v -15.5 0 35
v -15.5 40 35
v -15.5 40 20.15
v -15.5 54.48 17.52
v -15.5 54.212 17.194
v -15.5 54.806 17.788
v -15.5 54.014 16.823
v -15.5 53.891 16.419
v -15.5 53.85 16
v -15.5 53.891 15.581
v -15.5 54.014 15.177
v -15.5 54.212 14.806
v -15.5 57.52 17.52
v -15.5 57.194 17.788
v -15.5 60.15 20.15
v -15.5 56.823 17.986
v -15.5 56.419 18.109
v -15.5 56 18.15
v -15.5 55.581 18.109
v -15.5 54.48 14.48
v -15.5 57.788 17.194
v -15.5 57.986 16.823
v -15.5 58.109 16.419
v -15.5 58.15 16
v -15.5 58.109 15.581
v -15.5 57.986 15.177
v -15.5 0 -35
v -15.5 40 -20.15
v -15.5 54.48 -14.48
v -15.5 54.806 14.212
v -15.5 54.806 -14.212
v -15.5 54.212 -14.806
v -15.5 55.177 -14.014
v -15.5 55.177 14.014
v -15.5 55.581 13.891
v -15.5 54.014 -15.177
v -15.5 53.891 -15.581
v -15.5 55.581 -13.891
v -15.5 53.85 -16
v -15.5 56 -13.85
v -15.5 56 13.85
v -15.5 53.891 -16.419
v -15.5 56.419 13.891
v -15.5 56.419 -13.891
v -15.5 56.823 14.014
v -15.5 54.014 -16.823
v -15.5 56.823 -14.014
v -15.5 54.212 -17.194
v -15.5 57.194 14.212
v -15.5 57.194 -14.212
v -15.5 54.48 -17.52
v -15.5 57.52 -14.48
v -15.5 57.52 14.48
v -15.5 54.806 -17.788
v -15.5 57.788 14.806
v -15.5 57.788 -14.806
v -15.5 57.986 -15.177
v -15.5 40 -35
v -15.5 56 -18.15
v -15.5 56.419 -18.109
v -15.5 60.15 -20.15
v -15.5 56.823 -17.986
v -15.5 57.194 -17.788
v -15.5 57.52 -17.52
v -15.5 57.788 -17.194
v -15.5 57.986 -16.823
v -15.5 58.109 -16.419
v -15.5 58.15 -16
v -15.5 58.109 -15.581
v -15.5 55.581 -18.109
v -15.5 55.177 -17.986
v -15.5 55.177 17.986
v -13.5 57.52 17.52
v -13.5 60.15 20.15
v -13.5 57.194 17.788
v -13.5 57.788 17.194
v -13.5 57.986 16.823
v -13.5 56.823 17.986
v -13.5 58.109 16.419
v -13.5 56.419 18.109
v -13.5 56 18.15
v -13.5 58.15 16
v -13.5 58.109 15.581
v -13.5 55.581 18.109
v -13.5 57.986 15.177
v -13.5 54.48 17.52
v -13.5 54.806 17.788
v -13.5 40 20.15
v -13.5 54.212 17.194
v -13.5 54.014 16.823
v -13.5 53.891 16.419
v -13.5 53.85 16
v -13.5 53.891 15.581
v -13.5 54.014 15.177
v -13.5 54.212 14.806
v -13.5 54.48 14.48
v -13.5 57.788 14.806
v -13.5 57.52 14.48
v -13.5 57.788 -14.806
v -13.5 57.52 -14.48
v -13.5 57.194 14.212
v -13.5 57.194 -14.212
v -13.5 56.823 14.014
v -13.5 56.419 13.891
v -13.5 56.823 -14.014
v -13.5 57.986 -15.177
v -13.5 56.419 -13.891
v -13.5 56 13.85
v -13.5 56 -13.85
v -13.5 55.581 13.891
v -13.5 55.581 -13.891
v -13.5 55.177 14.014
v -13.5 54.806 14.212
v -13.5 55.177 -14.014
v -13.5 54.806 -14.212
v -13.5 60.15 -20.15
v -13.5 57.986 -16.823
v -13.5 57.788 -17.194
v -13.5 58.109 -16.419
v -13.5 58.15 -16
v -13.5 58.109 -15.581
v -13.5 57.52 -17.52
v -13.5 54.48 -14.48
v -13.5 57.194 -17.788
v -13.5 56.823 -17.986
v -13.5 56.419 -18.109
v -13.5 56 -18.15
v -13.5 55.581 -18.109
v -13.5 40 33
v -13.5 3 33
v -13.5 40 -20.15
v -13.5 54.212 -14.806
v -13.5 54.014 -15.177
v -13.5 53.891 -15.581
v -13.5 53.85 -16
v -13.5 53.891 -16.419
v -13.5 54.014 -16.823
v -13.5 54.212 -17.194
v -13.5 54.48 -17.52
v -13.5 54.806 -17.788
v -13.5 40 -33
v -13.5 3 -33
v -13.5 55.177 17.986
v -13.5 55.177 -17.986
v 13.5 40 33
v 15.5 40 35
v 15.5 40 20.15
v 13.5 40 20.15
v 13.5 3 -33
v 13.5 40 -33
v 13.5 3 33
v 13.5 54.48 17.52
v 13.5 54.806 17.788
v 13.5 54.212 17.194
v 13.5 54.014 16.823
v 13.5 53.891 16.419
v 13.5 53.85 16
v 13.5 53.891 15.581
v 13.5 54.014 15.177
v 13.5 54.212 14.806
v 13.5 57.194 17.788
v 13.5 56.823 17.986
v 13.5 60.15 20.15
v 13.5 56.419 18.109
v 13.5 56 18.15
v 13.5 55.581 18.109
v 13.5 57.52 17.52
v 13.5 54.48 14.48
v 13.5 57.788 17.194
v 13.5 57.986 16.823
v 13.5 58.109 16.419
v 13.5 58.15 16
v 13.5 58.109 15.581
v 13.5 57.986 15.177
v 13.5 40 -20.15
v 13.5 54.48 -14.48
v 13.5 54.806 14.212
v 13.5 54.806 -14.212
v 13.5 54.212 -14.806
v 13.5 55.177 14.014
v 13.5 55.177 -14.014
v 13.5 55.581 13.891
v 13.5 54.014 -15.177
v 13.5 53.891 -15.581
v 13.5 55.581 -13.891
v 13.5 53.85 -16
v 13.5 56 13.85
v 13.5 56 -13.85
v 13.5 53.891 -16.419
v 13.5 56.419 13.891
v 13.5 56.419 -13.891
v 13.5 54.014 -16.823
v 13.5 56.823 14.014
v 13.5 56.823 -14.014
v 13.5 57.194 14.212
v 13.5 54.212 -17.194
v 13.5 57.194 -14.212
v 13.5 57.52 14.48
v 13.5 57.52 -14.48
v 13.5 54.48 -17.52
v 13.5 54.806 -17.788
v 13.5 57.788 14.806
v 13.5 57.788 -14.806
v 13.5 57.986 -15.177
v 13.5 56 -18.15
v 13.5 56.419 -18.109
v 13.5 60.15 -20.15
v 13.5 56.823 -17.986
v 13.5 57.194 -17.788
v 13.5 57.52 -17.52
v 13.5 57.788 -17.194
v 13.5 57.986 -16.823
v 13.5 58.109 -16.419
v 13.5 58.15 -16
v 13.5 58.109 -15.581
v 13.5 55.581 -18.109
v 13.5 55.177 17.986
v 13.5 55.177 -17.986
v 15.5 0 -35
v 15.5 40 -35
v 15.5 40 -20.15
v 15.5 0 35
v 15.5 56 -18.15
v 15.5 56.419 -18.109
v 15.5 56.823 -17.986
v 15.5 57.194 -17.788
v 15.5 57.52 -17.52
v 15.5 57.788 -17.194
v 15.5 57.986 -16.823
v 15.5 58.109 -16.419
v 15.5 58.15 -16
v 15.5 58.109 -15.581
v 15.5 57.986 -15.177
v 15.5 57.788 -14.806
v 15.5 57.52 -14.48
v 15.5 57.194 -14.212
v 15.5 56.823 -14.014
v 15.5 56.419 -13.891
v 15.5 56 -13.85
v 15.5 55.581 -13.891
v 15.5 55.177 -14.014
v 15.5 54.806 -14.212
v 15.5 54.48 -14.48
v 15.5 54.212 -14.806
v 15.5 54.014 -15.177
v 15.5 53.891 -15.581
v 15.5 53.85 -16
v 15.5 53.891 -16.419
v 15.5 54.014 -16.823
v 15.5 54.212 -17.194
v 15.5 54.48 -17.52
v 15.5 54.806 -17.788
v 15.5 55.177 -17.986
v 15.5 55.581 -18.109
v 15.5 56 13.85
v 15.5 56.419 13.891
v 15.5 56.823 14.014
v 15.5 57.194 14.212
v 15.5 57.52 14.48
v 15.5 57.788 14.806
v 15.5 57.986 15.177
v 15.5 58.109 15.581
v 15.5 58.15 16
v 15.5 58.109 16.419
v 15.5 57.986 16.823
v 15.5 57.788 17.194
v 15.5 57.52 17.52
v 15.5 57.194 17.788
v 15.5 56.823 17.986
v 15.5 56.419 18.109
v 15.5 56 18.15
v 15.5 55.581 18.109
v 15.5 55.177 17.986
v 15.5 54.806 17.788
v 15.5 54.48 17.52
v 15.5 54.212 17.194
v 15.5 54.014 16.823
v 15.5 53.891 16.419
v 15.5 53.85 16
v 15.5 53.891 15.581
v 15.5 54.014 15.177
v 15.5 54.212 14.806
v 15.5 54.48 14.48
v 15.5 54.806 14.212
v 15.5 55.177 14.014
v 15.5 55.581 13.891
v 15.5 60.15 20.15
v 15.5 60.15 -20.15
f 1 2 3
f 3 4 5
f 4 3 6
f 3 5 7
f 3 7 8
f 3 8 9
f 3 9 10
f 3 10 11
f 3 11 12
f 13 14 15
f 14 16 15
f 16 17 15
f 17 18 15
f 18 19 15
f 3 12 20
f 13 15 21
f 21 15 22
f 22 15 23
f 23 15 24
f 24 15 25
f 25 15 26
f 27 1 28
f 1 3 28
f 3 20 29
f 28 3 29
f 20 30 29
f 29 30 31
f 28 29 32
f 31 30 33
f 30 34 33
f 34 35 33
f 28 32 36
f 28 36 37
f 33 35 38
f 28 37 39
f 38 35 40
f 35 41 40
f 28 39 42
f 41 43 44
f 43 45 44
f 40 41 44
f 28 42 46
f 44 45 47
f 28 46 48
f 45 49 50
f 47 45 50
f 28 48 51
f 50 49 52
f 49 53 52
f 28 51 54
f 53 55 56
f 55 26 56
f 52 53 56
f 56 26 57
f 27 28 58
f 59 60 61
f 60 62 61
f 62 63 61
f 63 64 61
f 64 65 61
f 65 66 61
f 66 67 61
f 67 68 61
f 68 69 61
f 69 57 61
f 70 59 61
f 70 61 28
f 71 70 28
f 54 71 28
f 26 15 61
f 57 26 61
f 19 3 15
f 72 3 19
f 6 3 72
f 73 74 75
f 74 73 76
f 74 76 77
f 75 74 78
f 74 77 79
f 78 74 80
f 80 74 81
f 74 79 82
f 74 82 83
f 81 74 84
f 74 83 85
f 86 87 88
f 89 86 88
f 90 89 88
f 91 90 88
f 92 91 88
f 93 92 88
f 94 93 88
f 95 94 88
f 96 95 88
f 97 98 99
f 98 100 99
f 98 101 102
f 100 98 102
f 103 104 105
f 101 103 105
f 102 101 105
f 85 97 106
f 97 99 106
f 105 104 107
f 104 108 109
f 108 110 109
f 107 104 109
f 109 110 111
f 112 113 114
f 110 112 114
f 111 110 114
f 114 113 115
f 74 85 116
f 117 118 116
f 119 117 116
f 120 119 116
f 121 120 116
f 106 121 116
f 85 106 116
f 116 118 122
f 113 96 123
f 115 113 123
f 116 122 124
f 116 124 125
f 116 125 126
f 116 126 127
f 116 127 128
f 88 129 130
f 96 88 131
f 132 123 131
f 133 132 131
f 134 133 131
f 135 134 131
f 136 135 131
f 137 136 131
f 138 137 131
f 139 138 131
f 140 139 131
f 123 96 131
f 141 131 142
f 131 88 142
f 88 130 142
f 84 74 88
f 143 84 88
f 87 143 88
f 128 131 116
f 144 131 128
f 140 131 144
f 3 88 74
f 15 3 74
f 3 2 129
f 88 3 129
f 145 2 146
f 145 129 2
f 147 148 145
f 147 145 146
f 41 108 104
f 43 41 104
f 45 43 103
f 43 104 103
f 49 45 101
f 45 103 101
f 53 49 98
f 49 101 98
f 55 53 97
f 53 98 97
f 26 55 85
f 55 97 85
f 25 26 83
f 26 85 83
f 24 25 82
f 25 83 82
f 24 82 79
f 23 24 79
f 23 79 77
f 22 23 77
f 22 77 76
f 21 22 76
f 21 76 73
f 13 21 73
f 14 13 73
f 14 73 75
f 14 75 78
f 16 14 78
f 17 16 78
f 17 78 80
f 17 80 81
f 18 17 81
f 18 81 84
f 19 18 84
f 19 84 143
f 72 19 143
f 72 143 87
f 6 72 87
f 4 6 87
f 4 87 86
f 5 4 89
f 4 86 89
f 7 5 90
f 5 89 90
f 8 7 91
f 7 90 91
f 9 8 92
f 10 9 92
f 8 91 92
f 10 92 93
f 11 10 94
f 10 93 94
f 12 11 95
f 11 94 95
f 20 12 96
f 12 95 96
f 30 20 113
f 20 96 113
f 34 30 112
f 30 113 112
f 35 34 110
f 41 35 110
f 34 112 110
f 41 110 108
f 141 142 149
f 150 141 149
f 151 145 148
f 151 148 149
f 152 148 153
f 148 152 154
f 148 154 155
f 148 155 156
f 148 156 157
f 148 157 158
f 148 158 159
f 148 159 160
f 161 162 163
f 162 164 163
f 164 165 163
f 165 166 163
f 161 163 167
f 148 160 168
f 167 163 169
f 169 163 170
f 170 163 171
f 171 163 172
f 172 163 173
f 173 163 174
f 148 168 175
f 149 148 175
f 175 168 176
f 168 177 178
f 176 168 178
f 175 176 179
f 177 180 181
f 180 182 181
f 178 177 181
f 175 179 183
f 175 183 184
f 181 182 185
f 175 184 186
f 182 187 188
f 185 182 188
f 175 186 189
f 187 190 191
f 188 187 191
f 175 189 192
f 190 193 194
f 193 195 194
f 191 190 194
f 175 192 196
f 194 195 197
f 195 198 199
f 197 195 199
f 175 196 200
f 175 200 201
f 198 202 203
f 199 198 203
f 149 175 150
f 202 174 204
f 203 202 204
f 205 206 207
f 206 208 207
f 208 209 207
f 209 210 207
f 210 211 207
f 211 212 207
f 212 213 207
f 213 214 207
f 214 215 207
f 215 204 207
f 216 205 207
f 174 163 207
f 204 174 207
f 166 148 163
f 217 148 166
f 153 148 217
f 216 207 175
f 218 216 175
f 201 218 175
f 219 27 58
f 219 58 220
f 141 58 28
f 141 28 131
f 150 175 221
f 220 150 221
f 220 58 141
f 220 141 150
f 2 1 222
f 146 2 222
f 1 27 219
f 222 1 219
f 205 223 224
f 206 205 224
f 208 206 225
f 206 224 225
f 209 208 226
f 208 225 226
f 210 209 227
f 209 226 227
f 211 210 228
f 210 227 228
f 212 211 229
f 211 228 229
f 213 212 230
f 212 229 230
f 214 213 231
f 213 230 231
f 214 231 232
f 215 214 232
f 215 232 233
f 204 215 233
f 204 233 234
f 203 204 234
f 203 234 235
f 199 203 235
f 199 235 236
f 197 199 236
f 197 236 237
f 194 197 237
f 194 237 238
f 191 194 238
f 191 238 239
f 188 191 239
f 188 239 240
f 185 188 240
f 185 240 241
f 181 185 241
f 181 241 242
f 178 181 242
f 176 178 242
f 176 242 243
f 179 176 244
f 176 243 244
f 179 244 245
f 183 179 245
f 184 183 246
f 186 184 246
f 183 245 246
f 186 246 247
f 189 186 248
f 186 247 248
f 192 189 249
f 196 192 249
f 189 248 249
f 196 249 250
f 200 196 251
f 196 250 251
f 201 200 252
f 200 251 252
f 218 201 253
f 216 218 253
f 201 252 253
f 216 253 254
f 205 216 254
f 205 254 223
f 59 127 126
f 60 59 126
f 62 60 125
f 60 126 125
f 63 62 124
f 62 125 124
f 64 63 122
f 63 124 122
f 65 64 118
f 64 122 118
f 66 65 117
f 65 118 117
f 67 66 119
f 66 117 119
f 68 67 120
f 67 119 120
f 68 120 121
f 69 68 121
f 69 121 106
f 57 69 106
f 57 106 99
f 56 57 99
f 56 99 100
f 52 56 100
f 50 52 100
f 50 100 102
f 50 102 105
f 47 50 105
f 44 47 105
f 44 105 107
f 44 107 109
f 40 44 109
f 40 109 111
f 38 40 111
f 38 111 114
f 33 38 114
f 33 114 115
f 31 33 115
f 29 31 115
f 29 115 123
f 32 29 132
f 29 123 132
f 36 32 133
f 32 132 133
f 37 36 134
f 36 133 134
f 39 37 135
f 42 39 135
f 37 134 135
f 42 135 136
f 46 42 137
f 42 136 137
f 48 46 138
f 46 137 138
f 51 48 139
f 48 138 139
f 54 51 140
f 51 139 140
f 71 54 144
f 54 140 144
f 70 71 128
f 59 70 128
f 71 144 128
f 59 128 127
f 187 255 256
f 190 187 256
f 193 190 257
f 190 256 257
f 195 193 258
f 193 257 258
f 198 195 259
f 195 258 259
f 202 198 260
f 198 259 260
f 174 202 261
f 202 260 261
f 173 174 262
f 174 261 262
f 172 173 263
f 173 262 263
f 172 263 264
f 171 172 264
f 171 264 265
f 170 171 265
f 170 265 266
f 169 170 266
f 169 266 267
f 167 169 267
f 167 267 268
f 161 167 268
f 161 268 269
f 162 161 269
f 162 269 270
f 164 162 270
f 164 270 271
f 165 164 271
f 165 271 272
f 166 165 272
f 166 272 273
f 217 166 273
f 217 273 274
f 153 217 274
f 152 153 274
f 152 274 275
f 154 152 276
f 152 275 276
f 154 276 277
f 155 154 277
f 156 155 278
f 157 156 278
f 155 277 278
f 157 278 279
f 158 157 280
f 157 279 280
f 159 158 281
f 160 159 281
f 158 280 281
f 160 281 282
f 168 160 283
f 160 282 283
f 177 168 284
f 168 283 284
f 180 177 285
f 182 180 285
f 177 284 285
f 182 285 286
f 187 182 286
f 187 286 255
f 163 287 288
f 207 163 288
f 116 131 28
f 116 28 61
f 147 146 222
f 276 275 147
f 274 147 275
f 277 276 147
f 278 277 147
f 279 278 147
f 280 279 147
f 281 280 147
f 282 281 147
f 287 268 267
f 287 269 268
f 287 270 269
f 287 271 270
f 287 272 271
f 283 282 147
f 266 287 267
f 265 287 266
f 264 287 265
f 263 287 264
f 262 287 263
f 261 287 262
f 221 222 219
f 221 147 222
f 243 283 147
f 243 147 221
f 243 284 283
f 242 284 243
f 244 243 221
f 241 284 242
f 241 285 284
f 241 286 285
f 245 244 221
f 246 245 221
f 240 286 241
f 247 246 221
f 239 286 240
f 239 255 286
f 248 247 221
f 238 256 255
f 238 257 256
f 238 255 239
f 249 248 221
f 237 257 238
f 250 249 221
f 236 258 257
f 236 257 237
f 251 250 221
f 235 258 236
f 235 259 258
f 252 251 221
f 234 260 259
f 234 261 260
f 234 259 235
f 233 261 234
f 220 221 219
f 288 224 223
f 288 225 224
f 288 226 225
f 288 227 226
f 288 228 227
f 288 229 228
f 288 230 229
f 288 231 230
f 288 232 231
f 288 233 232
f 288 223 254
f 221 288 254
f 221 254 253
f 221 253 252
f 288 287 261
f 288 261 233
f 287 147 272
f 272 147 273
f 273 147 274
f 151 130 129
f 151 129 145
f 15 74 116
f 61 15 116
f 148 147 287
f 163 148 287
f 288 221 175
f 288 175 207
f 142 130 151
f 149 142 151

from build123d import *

# Parameters (mm, degrees)
CROQUIS1_W              = 31
CROQUIS1_H              = 70
CROQUIS1_W_2            = 27
CROQUIS1_H_2            = 66
SALIENTE_EXTRUIR1_DEPTH = 40
CROQUIS4_W              = 40.3
CROQUIS4_H              = 20.15
CROQUIS4_R              = 2.15
SALIENTE_EXTRUIR2_DEPTH = 31
CROQUIS5_W              = 27
CROQUIS5_H              = 40.3
CORTAR_EXTRUIR2_DEPTH   = 40
CROQUIS6_W              = 31
CROQUIS6_H              = 70
SALIENTE_EXTRUIR3_DEPTH = 3


with BuildPart() as part:
    # Croquis1 → Saliente-Extruir1 (new body)
    with BuildSketch(Plane(origin=(0, 0, 0), x_dir=(1, 0, 0), z_dir=(0, 1, 0))):
        Rectangle(CROQUIS1_W, CROQUIS1_H)
        Rectangle(CROQUIS1_W_2, CROQUIS1_H_2, mode=Mode.SUBTRACT)
    extrude(amount=SALIENTE_EXTRUIR1_DEPTH)

    # Croquis4 → Saliente-Extruir2 (add, through all)
    with BuildSketch(Plane(origin=(15.5, 0, 0), x_dir=(0, 0, -1), z_dir=(1, 0, 0))):
        with Locations((0, 50.075)):
            Rectangle(CROQUIS4_W, CROQUIS4_H)
        with Locations((-16, 56)):
            Circle(CROQUIS4_R, mode=Mode.SUBTRACT)
        with Locations((16, 56)):
            Circle(CROQUIS4_R, mode=Mode.SUBTRACT)
    extrude(amount=-SALIENTE_EXTRUIR2_DEPTH)

    # Croquis5 → Cortar-Extruir2 (cut)
    with BuildSketch(Plane(origin=(0, 60.15, 0), x_dir=(1, 0, 0), z_dir=(0, 1, 0))):
        Rectangle(CROQUIS5_W, CROQUIS5_H)
    extrude(amount=-CORTAR_EXTRUIR2_DEPTH, mode=Mode.SUBTRACT)

    # Croquis6 → Saliente-Extruir3 (add)
    with BuildSketch(Plane.XZ):
        Rectangle(CROQUIS6_W, CROQUIS6_H)
    extrude(amount=-SALIENTE_EXTRUIR3_DEPTH)


solid = part.part
